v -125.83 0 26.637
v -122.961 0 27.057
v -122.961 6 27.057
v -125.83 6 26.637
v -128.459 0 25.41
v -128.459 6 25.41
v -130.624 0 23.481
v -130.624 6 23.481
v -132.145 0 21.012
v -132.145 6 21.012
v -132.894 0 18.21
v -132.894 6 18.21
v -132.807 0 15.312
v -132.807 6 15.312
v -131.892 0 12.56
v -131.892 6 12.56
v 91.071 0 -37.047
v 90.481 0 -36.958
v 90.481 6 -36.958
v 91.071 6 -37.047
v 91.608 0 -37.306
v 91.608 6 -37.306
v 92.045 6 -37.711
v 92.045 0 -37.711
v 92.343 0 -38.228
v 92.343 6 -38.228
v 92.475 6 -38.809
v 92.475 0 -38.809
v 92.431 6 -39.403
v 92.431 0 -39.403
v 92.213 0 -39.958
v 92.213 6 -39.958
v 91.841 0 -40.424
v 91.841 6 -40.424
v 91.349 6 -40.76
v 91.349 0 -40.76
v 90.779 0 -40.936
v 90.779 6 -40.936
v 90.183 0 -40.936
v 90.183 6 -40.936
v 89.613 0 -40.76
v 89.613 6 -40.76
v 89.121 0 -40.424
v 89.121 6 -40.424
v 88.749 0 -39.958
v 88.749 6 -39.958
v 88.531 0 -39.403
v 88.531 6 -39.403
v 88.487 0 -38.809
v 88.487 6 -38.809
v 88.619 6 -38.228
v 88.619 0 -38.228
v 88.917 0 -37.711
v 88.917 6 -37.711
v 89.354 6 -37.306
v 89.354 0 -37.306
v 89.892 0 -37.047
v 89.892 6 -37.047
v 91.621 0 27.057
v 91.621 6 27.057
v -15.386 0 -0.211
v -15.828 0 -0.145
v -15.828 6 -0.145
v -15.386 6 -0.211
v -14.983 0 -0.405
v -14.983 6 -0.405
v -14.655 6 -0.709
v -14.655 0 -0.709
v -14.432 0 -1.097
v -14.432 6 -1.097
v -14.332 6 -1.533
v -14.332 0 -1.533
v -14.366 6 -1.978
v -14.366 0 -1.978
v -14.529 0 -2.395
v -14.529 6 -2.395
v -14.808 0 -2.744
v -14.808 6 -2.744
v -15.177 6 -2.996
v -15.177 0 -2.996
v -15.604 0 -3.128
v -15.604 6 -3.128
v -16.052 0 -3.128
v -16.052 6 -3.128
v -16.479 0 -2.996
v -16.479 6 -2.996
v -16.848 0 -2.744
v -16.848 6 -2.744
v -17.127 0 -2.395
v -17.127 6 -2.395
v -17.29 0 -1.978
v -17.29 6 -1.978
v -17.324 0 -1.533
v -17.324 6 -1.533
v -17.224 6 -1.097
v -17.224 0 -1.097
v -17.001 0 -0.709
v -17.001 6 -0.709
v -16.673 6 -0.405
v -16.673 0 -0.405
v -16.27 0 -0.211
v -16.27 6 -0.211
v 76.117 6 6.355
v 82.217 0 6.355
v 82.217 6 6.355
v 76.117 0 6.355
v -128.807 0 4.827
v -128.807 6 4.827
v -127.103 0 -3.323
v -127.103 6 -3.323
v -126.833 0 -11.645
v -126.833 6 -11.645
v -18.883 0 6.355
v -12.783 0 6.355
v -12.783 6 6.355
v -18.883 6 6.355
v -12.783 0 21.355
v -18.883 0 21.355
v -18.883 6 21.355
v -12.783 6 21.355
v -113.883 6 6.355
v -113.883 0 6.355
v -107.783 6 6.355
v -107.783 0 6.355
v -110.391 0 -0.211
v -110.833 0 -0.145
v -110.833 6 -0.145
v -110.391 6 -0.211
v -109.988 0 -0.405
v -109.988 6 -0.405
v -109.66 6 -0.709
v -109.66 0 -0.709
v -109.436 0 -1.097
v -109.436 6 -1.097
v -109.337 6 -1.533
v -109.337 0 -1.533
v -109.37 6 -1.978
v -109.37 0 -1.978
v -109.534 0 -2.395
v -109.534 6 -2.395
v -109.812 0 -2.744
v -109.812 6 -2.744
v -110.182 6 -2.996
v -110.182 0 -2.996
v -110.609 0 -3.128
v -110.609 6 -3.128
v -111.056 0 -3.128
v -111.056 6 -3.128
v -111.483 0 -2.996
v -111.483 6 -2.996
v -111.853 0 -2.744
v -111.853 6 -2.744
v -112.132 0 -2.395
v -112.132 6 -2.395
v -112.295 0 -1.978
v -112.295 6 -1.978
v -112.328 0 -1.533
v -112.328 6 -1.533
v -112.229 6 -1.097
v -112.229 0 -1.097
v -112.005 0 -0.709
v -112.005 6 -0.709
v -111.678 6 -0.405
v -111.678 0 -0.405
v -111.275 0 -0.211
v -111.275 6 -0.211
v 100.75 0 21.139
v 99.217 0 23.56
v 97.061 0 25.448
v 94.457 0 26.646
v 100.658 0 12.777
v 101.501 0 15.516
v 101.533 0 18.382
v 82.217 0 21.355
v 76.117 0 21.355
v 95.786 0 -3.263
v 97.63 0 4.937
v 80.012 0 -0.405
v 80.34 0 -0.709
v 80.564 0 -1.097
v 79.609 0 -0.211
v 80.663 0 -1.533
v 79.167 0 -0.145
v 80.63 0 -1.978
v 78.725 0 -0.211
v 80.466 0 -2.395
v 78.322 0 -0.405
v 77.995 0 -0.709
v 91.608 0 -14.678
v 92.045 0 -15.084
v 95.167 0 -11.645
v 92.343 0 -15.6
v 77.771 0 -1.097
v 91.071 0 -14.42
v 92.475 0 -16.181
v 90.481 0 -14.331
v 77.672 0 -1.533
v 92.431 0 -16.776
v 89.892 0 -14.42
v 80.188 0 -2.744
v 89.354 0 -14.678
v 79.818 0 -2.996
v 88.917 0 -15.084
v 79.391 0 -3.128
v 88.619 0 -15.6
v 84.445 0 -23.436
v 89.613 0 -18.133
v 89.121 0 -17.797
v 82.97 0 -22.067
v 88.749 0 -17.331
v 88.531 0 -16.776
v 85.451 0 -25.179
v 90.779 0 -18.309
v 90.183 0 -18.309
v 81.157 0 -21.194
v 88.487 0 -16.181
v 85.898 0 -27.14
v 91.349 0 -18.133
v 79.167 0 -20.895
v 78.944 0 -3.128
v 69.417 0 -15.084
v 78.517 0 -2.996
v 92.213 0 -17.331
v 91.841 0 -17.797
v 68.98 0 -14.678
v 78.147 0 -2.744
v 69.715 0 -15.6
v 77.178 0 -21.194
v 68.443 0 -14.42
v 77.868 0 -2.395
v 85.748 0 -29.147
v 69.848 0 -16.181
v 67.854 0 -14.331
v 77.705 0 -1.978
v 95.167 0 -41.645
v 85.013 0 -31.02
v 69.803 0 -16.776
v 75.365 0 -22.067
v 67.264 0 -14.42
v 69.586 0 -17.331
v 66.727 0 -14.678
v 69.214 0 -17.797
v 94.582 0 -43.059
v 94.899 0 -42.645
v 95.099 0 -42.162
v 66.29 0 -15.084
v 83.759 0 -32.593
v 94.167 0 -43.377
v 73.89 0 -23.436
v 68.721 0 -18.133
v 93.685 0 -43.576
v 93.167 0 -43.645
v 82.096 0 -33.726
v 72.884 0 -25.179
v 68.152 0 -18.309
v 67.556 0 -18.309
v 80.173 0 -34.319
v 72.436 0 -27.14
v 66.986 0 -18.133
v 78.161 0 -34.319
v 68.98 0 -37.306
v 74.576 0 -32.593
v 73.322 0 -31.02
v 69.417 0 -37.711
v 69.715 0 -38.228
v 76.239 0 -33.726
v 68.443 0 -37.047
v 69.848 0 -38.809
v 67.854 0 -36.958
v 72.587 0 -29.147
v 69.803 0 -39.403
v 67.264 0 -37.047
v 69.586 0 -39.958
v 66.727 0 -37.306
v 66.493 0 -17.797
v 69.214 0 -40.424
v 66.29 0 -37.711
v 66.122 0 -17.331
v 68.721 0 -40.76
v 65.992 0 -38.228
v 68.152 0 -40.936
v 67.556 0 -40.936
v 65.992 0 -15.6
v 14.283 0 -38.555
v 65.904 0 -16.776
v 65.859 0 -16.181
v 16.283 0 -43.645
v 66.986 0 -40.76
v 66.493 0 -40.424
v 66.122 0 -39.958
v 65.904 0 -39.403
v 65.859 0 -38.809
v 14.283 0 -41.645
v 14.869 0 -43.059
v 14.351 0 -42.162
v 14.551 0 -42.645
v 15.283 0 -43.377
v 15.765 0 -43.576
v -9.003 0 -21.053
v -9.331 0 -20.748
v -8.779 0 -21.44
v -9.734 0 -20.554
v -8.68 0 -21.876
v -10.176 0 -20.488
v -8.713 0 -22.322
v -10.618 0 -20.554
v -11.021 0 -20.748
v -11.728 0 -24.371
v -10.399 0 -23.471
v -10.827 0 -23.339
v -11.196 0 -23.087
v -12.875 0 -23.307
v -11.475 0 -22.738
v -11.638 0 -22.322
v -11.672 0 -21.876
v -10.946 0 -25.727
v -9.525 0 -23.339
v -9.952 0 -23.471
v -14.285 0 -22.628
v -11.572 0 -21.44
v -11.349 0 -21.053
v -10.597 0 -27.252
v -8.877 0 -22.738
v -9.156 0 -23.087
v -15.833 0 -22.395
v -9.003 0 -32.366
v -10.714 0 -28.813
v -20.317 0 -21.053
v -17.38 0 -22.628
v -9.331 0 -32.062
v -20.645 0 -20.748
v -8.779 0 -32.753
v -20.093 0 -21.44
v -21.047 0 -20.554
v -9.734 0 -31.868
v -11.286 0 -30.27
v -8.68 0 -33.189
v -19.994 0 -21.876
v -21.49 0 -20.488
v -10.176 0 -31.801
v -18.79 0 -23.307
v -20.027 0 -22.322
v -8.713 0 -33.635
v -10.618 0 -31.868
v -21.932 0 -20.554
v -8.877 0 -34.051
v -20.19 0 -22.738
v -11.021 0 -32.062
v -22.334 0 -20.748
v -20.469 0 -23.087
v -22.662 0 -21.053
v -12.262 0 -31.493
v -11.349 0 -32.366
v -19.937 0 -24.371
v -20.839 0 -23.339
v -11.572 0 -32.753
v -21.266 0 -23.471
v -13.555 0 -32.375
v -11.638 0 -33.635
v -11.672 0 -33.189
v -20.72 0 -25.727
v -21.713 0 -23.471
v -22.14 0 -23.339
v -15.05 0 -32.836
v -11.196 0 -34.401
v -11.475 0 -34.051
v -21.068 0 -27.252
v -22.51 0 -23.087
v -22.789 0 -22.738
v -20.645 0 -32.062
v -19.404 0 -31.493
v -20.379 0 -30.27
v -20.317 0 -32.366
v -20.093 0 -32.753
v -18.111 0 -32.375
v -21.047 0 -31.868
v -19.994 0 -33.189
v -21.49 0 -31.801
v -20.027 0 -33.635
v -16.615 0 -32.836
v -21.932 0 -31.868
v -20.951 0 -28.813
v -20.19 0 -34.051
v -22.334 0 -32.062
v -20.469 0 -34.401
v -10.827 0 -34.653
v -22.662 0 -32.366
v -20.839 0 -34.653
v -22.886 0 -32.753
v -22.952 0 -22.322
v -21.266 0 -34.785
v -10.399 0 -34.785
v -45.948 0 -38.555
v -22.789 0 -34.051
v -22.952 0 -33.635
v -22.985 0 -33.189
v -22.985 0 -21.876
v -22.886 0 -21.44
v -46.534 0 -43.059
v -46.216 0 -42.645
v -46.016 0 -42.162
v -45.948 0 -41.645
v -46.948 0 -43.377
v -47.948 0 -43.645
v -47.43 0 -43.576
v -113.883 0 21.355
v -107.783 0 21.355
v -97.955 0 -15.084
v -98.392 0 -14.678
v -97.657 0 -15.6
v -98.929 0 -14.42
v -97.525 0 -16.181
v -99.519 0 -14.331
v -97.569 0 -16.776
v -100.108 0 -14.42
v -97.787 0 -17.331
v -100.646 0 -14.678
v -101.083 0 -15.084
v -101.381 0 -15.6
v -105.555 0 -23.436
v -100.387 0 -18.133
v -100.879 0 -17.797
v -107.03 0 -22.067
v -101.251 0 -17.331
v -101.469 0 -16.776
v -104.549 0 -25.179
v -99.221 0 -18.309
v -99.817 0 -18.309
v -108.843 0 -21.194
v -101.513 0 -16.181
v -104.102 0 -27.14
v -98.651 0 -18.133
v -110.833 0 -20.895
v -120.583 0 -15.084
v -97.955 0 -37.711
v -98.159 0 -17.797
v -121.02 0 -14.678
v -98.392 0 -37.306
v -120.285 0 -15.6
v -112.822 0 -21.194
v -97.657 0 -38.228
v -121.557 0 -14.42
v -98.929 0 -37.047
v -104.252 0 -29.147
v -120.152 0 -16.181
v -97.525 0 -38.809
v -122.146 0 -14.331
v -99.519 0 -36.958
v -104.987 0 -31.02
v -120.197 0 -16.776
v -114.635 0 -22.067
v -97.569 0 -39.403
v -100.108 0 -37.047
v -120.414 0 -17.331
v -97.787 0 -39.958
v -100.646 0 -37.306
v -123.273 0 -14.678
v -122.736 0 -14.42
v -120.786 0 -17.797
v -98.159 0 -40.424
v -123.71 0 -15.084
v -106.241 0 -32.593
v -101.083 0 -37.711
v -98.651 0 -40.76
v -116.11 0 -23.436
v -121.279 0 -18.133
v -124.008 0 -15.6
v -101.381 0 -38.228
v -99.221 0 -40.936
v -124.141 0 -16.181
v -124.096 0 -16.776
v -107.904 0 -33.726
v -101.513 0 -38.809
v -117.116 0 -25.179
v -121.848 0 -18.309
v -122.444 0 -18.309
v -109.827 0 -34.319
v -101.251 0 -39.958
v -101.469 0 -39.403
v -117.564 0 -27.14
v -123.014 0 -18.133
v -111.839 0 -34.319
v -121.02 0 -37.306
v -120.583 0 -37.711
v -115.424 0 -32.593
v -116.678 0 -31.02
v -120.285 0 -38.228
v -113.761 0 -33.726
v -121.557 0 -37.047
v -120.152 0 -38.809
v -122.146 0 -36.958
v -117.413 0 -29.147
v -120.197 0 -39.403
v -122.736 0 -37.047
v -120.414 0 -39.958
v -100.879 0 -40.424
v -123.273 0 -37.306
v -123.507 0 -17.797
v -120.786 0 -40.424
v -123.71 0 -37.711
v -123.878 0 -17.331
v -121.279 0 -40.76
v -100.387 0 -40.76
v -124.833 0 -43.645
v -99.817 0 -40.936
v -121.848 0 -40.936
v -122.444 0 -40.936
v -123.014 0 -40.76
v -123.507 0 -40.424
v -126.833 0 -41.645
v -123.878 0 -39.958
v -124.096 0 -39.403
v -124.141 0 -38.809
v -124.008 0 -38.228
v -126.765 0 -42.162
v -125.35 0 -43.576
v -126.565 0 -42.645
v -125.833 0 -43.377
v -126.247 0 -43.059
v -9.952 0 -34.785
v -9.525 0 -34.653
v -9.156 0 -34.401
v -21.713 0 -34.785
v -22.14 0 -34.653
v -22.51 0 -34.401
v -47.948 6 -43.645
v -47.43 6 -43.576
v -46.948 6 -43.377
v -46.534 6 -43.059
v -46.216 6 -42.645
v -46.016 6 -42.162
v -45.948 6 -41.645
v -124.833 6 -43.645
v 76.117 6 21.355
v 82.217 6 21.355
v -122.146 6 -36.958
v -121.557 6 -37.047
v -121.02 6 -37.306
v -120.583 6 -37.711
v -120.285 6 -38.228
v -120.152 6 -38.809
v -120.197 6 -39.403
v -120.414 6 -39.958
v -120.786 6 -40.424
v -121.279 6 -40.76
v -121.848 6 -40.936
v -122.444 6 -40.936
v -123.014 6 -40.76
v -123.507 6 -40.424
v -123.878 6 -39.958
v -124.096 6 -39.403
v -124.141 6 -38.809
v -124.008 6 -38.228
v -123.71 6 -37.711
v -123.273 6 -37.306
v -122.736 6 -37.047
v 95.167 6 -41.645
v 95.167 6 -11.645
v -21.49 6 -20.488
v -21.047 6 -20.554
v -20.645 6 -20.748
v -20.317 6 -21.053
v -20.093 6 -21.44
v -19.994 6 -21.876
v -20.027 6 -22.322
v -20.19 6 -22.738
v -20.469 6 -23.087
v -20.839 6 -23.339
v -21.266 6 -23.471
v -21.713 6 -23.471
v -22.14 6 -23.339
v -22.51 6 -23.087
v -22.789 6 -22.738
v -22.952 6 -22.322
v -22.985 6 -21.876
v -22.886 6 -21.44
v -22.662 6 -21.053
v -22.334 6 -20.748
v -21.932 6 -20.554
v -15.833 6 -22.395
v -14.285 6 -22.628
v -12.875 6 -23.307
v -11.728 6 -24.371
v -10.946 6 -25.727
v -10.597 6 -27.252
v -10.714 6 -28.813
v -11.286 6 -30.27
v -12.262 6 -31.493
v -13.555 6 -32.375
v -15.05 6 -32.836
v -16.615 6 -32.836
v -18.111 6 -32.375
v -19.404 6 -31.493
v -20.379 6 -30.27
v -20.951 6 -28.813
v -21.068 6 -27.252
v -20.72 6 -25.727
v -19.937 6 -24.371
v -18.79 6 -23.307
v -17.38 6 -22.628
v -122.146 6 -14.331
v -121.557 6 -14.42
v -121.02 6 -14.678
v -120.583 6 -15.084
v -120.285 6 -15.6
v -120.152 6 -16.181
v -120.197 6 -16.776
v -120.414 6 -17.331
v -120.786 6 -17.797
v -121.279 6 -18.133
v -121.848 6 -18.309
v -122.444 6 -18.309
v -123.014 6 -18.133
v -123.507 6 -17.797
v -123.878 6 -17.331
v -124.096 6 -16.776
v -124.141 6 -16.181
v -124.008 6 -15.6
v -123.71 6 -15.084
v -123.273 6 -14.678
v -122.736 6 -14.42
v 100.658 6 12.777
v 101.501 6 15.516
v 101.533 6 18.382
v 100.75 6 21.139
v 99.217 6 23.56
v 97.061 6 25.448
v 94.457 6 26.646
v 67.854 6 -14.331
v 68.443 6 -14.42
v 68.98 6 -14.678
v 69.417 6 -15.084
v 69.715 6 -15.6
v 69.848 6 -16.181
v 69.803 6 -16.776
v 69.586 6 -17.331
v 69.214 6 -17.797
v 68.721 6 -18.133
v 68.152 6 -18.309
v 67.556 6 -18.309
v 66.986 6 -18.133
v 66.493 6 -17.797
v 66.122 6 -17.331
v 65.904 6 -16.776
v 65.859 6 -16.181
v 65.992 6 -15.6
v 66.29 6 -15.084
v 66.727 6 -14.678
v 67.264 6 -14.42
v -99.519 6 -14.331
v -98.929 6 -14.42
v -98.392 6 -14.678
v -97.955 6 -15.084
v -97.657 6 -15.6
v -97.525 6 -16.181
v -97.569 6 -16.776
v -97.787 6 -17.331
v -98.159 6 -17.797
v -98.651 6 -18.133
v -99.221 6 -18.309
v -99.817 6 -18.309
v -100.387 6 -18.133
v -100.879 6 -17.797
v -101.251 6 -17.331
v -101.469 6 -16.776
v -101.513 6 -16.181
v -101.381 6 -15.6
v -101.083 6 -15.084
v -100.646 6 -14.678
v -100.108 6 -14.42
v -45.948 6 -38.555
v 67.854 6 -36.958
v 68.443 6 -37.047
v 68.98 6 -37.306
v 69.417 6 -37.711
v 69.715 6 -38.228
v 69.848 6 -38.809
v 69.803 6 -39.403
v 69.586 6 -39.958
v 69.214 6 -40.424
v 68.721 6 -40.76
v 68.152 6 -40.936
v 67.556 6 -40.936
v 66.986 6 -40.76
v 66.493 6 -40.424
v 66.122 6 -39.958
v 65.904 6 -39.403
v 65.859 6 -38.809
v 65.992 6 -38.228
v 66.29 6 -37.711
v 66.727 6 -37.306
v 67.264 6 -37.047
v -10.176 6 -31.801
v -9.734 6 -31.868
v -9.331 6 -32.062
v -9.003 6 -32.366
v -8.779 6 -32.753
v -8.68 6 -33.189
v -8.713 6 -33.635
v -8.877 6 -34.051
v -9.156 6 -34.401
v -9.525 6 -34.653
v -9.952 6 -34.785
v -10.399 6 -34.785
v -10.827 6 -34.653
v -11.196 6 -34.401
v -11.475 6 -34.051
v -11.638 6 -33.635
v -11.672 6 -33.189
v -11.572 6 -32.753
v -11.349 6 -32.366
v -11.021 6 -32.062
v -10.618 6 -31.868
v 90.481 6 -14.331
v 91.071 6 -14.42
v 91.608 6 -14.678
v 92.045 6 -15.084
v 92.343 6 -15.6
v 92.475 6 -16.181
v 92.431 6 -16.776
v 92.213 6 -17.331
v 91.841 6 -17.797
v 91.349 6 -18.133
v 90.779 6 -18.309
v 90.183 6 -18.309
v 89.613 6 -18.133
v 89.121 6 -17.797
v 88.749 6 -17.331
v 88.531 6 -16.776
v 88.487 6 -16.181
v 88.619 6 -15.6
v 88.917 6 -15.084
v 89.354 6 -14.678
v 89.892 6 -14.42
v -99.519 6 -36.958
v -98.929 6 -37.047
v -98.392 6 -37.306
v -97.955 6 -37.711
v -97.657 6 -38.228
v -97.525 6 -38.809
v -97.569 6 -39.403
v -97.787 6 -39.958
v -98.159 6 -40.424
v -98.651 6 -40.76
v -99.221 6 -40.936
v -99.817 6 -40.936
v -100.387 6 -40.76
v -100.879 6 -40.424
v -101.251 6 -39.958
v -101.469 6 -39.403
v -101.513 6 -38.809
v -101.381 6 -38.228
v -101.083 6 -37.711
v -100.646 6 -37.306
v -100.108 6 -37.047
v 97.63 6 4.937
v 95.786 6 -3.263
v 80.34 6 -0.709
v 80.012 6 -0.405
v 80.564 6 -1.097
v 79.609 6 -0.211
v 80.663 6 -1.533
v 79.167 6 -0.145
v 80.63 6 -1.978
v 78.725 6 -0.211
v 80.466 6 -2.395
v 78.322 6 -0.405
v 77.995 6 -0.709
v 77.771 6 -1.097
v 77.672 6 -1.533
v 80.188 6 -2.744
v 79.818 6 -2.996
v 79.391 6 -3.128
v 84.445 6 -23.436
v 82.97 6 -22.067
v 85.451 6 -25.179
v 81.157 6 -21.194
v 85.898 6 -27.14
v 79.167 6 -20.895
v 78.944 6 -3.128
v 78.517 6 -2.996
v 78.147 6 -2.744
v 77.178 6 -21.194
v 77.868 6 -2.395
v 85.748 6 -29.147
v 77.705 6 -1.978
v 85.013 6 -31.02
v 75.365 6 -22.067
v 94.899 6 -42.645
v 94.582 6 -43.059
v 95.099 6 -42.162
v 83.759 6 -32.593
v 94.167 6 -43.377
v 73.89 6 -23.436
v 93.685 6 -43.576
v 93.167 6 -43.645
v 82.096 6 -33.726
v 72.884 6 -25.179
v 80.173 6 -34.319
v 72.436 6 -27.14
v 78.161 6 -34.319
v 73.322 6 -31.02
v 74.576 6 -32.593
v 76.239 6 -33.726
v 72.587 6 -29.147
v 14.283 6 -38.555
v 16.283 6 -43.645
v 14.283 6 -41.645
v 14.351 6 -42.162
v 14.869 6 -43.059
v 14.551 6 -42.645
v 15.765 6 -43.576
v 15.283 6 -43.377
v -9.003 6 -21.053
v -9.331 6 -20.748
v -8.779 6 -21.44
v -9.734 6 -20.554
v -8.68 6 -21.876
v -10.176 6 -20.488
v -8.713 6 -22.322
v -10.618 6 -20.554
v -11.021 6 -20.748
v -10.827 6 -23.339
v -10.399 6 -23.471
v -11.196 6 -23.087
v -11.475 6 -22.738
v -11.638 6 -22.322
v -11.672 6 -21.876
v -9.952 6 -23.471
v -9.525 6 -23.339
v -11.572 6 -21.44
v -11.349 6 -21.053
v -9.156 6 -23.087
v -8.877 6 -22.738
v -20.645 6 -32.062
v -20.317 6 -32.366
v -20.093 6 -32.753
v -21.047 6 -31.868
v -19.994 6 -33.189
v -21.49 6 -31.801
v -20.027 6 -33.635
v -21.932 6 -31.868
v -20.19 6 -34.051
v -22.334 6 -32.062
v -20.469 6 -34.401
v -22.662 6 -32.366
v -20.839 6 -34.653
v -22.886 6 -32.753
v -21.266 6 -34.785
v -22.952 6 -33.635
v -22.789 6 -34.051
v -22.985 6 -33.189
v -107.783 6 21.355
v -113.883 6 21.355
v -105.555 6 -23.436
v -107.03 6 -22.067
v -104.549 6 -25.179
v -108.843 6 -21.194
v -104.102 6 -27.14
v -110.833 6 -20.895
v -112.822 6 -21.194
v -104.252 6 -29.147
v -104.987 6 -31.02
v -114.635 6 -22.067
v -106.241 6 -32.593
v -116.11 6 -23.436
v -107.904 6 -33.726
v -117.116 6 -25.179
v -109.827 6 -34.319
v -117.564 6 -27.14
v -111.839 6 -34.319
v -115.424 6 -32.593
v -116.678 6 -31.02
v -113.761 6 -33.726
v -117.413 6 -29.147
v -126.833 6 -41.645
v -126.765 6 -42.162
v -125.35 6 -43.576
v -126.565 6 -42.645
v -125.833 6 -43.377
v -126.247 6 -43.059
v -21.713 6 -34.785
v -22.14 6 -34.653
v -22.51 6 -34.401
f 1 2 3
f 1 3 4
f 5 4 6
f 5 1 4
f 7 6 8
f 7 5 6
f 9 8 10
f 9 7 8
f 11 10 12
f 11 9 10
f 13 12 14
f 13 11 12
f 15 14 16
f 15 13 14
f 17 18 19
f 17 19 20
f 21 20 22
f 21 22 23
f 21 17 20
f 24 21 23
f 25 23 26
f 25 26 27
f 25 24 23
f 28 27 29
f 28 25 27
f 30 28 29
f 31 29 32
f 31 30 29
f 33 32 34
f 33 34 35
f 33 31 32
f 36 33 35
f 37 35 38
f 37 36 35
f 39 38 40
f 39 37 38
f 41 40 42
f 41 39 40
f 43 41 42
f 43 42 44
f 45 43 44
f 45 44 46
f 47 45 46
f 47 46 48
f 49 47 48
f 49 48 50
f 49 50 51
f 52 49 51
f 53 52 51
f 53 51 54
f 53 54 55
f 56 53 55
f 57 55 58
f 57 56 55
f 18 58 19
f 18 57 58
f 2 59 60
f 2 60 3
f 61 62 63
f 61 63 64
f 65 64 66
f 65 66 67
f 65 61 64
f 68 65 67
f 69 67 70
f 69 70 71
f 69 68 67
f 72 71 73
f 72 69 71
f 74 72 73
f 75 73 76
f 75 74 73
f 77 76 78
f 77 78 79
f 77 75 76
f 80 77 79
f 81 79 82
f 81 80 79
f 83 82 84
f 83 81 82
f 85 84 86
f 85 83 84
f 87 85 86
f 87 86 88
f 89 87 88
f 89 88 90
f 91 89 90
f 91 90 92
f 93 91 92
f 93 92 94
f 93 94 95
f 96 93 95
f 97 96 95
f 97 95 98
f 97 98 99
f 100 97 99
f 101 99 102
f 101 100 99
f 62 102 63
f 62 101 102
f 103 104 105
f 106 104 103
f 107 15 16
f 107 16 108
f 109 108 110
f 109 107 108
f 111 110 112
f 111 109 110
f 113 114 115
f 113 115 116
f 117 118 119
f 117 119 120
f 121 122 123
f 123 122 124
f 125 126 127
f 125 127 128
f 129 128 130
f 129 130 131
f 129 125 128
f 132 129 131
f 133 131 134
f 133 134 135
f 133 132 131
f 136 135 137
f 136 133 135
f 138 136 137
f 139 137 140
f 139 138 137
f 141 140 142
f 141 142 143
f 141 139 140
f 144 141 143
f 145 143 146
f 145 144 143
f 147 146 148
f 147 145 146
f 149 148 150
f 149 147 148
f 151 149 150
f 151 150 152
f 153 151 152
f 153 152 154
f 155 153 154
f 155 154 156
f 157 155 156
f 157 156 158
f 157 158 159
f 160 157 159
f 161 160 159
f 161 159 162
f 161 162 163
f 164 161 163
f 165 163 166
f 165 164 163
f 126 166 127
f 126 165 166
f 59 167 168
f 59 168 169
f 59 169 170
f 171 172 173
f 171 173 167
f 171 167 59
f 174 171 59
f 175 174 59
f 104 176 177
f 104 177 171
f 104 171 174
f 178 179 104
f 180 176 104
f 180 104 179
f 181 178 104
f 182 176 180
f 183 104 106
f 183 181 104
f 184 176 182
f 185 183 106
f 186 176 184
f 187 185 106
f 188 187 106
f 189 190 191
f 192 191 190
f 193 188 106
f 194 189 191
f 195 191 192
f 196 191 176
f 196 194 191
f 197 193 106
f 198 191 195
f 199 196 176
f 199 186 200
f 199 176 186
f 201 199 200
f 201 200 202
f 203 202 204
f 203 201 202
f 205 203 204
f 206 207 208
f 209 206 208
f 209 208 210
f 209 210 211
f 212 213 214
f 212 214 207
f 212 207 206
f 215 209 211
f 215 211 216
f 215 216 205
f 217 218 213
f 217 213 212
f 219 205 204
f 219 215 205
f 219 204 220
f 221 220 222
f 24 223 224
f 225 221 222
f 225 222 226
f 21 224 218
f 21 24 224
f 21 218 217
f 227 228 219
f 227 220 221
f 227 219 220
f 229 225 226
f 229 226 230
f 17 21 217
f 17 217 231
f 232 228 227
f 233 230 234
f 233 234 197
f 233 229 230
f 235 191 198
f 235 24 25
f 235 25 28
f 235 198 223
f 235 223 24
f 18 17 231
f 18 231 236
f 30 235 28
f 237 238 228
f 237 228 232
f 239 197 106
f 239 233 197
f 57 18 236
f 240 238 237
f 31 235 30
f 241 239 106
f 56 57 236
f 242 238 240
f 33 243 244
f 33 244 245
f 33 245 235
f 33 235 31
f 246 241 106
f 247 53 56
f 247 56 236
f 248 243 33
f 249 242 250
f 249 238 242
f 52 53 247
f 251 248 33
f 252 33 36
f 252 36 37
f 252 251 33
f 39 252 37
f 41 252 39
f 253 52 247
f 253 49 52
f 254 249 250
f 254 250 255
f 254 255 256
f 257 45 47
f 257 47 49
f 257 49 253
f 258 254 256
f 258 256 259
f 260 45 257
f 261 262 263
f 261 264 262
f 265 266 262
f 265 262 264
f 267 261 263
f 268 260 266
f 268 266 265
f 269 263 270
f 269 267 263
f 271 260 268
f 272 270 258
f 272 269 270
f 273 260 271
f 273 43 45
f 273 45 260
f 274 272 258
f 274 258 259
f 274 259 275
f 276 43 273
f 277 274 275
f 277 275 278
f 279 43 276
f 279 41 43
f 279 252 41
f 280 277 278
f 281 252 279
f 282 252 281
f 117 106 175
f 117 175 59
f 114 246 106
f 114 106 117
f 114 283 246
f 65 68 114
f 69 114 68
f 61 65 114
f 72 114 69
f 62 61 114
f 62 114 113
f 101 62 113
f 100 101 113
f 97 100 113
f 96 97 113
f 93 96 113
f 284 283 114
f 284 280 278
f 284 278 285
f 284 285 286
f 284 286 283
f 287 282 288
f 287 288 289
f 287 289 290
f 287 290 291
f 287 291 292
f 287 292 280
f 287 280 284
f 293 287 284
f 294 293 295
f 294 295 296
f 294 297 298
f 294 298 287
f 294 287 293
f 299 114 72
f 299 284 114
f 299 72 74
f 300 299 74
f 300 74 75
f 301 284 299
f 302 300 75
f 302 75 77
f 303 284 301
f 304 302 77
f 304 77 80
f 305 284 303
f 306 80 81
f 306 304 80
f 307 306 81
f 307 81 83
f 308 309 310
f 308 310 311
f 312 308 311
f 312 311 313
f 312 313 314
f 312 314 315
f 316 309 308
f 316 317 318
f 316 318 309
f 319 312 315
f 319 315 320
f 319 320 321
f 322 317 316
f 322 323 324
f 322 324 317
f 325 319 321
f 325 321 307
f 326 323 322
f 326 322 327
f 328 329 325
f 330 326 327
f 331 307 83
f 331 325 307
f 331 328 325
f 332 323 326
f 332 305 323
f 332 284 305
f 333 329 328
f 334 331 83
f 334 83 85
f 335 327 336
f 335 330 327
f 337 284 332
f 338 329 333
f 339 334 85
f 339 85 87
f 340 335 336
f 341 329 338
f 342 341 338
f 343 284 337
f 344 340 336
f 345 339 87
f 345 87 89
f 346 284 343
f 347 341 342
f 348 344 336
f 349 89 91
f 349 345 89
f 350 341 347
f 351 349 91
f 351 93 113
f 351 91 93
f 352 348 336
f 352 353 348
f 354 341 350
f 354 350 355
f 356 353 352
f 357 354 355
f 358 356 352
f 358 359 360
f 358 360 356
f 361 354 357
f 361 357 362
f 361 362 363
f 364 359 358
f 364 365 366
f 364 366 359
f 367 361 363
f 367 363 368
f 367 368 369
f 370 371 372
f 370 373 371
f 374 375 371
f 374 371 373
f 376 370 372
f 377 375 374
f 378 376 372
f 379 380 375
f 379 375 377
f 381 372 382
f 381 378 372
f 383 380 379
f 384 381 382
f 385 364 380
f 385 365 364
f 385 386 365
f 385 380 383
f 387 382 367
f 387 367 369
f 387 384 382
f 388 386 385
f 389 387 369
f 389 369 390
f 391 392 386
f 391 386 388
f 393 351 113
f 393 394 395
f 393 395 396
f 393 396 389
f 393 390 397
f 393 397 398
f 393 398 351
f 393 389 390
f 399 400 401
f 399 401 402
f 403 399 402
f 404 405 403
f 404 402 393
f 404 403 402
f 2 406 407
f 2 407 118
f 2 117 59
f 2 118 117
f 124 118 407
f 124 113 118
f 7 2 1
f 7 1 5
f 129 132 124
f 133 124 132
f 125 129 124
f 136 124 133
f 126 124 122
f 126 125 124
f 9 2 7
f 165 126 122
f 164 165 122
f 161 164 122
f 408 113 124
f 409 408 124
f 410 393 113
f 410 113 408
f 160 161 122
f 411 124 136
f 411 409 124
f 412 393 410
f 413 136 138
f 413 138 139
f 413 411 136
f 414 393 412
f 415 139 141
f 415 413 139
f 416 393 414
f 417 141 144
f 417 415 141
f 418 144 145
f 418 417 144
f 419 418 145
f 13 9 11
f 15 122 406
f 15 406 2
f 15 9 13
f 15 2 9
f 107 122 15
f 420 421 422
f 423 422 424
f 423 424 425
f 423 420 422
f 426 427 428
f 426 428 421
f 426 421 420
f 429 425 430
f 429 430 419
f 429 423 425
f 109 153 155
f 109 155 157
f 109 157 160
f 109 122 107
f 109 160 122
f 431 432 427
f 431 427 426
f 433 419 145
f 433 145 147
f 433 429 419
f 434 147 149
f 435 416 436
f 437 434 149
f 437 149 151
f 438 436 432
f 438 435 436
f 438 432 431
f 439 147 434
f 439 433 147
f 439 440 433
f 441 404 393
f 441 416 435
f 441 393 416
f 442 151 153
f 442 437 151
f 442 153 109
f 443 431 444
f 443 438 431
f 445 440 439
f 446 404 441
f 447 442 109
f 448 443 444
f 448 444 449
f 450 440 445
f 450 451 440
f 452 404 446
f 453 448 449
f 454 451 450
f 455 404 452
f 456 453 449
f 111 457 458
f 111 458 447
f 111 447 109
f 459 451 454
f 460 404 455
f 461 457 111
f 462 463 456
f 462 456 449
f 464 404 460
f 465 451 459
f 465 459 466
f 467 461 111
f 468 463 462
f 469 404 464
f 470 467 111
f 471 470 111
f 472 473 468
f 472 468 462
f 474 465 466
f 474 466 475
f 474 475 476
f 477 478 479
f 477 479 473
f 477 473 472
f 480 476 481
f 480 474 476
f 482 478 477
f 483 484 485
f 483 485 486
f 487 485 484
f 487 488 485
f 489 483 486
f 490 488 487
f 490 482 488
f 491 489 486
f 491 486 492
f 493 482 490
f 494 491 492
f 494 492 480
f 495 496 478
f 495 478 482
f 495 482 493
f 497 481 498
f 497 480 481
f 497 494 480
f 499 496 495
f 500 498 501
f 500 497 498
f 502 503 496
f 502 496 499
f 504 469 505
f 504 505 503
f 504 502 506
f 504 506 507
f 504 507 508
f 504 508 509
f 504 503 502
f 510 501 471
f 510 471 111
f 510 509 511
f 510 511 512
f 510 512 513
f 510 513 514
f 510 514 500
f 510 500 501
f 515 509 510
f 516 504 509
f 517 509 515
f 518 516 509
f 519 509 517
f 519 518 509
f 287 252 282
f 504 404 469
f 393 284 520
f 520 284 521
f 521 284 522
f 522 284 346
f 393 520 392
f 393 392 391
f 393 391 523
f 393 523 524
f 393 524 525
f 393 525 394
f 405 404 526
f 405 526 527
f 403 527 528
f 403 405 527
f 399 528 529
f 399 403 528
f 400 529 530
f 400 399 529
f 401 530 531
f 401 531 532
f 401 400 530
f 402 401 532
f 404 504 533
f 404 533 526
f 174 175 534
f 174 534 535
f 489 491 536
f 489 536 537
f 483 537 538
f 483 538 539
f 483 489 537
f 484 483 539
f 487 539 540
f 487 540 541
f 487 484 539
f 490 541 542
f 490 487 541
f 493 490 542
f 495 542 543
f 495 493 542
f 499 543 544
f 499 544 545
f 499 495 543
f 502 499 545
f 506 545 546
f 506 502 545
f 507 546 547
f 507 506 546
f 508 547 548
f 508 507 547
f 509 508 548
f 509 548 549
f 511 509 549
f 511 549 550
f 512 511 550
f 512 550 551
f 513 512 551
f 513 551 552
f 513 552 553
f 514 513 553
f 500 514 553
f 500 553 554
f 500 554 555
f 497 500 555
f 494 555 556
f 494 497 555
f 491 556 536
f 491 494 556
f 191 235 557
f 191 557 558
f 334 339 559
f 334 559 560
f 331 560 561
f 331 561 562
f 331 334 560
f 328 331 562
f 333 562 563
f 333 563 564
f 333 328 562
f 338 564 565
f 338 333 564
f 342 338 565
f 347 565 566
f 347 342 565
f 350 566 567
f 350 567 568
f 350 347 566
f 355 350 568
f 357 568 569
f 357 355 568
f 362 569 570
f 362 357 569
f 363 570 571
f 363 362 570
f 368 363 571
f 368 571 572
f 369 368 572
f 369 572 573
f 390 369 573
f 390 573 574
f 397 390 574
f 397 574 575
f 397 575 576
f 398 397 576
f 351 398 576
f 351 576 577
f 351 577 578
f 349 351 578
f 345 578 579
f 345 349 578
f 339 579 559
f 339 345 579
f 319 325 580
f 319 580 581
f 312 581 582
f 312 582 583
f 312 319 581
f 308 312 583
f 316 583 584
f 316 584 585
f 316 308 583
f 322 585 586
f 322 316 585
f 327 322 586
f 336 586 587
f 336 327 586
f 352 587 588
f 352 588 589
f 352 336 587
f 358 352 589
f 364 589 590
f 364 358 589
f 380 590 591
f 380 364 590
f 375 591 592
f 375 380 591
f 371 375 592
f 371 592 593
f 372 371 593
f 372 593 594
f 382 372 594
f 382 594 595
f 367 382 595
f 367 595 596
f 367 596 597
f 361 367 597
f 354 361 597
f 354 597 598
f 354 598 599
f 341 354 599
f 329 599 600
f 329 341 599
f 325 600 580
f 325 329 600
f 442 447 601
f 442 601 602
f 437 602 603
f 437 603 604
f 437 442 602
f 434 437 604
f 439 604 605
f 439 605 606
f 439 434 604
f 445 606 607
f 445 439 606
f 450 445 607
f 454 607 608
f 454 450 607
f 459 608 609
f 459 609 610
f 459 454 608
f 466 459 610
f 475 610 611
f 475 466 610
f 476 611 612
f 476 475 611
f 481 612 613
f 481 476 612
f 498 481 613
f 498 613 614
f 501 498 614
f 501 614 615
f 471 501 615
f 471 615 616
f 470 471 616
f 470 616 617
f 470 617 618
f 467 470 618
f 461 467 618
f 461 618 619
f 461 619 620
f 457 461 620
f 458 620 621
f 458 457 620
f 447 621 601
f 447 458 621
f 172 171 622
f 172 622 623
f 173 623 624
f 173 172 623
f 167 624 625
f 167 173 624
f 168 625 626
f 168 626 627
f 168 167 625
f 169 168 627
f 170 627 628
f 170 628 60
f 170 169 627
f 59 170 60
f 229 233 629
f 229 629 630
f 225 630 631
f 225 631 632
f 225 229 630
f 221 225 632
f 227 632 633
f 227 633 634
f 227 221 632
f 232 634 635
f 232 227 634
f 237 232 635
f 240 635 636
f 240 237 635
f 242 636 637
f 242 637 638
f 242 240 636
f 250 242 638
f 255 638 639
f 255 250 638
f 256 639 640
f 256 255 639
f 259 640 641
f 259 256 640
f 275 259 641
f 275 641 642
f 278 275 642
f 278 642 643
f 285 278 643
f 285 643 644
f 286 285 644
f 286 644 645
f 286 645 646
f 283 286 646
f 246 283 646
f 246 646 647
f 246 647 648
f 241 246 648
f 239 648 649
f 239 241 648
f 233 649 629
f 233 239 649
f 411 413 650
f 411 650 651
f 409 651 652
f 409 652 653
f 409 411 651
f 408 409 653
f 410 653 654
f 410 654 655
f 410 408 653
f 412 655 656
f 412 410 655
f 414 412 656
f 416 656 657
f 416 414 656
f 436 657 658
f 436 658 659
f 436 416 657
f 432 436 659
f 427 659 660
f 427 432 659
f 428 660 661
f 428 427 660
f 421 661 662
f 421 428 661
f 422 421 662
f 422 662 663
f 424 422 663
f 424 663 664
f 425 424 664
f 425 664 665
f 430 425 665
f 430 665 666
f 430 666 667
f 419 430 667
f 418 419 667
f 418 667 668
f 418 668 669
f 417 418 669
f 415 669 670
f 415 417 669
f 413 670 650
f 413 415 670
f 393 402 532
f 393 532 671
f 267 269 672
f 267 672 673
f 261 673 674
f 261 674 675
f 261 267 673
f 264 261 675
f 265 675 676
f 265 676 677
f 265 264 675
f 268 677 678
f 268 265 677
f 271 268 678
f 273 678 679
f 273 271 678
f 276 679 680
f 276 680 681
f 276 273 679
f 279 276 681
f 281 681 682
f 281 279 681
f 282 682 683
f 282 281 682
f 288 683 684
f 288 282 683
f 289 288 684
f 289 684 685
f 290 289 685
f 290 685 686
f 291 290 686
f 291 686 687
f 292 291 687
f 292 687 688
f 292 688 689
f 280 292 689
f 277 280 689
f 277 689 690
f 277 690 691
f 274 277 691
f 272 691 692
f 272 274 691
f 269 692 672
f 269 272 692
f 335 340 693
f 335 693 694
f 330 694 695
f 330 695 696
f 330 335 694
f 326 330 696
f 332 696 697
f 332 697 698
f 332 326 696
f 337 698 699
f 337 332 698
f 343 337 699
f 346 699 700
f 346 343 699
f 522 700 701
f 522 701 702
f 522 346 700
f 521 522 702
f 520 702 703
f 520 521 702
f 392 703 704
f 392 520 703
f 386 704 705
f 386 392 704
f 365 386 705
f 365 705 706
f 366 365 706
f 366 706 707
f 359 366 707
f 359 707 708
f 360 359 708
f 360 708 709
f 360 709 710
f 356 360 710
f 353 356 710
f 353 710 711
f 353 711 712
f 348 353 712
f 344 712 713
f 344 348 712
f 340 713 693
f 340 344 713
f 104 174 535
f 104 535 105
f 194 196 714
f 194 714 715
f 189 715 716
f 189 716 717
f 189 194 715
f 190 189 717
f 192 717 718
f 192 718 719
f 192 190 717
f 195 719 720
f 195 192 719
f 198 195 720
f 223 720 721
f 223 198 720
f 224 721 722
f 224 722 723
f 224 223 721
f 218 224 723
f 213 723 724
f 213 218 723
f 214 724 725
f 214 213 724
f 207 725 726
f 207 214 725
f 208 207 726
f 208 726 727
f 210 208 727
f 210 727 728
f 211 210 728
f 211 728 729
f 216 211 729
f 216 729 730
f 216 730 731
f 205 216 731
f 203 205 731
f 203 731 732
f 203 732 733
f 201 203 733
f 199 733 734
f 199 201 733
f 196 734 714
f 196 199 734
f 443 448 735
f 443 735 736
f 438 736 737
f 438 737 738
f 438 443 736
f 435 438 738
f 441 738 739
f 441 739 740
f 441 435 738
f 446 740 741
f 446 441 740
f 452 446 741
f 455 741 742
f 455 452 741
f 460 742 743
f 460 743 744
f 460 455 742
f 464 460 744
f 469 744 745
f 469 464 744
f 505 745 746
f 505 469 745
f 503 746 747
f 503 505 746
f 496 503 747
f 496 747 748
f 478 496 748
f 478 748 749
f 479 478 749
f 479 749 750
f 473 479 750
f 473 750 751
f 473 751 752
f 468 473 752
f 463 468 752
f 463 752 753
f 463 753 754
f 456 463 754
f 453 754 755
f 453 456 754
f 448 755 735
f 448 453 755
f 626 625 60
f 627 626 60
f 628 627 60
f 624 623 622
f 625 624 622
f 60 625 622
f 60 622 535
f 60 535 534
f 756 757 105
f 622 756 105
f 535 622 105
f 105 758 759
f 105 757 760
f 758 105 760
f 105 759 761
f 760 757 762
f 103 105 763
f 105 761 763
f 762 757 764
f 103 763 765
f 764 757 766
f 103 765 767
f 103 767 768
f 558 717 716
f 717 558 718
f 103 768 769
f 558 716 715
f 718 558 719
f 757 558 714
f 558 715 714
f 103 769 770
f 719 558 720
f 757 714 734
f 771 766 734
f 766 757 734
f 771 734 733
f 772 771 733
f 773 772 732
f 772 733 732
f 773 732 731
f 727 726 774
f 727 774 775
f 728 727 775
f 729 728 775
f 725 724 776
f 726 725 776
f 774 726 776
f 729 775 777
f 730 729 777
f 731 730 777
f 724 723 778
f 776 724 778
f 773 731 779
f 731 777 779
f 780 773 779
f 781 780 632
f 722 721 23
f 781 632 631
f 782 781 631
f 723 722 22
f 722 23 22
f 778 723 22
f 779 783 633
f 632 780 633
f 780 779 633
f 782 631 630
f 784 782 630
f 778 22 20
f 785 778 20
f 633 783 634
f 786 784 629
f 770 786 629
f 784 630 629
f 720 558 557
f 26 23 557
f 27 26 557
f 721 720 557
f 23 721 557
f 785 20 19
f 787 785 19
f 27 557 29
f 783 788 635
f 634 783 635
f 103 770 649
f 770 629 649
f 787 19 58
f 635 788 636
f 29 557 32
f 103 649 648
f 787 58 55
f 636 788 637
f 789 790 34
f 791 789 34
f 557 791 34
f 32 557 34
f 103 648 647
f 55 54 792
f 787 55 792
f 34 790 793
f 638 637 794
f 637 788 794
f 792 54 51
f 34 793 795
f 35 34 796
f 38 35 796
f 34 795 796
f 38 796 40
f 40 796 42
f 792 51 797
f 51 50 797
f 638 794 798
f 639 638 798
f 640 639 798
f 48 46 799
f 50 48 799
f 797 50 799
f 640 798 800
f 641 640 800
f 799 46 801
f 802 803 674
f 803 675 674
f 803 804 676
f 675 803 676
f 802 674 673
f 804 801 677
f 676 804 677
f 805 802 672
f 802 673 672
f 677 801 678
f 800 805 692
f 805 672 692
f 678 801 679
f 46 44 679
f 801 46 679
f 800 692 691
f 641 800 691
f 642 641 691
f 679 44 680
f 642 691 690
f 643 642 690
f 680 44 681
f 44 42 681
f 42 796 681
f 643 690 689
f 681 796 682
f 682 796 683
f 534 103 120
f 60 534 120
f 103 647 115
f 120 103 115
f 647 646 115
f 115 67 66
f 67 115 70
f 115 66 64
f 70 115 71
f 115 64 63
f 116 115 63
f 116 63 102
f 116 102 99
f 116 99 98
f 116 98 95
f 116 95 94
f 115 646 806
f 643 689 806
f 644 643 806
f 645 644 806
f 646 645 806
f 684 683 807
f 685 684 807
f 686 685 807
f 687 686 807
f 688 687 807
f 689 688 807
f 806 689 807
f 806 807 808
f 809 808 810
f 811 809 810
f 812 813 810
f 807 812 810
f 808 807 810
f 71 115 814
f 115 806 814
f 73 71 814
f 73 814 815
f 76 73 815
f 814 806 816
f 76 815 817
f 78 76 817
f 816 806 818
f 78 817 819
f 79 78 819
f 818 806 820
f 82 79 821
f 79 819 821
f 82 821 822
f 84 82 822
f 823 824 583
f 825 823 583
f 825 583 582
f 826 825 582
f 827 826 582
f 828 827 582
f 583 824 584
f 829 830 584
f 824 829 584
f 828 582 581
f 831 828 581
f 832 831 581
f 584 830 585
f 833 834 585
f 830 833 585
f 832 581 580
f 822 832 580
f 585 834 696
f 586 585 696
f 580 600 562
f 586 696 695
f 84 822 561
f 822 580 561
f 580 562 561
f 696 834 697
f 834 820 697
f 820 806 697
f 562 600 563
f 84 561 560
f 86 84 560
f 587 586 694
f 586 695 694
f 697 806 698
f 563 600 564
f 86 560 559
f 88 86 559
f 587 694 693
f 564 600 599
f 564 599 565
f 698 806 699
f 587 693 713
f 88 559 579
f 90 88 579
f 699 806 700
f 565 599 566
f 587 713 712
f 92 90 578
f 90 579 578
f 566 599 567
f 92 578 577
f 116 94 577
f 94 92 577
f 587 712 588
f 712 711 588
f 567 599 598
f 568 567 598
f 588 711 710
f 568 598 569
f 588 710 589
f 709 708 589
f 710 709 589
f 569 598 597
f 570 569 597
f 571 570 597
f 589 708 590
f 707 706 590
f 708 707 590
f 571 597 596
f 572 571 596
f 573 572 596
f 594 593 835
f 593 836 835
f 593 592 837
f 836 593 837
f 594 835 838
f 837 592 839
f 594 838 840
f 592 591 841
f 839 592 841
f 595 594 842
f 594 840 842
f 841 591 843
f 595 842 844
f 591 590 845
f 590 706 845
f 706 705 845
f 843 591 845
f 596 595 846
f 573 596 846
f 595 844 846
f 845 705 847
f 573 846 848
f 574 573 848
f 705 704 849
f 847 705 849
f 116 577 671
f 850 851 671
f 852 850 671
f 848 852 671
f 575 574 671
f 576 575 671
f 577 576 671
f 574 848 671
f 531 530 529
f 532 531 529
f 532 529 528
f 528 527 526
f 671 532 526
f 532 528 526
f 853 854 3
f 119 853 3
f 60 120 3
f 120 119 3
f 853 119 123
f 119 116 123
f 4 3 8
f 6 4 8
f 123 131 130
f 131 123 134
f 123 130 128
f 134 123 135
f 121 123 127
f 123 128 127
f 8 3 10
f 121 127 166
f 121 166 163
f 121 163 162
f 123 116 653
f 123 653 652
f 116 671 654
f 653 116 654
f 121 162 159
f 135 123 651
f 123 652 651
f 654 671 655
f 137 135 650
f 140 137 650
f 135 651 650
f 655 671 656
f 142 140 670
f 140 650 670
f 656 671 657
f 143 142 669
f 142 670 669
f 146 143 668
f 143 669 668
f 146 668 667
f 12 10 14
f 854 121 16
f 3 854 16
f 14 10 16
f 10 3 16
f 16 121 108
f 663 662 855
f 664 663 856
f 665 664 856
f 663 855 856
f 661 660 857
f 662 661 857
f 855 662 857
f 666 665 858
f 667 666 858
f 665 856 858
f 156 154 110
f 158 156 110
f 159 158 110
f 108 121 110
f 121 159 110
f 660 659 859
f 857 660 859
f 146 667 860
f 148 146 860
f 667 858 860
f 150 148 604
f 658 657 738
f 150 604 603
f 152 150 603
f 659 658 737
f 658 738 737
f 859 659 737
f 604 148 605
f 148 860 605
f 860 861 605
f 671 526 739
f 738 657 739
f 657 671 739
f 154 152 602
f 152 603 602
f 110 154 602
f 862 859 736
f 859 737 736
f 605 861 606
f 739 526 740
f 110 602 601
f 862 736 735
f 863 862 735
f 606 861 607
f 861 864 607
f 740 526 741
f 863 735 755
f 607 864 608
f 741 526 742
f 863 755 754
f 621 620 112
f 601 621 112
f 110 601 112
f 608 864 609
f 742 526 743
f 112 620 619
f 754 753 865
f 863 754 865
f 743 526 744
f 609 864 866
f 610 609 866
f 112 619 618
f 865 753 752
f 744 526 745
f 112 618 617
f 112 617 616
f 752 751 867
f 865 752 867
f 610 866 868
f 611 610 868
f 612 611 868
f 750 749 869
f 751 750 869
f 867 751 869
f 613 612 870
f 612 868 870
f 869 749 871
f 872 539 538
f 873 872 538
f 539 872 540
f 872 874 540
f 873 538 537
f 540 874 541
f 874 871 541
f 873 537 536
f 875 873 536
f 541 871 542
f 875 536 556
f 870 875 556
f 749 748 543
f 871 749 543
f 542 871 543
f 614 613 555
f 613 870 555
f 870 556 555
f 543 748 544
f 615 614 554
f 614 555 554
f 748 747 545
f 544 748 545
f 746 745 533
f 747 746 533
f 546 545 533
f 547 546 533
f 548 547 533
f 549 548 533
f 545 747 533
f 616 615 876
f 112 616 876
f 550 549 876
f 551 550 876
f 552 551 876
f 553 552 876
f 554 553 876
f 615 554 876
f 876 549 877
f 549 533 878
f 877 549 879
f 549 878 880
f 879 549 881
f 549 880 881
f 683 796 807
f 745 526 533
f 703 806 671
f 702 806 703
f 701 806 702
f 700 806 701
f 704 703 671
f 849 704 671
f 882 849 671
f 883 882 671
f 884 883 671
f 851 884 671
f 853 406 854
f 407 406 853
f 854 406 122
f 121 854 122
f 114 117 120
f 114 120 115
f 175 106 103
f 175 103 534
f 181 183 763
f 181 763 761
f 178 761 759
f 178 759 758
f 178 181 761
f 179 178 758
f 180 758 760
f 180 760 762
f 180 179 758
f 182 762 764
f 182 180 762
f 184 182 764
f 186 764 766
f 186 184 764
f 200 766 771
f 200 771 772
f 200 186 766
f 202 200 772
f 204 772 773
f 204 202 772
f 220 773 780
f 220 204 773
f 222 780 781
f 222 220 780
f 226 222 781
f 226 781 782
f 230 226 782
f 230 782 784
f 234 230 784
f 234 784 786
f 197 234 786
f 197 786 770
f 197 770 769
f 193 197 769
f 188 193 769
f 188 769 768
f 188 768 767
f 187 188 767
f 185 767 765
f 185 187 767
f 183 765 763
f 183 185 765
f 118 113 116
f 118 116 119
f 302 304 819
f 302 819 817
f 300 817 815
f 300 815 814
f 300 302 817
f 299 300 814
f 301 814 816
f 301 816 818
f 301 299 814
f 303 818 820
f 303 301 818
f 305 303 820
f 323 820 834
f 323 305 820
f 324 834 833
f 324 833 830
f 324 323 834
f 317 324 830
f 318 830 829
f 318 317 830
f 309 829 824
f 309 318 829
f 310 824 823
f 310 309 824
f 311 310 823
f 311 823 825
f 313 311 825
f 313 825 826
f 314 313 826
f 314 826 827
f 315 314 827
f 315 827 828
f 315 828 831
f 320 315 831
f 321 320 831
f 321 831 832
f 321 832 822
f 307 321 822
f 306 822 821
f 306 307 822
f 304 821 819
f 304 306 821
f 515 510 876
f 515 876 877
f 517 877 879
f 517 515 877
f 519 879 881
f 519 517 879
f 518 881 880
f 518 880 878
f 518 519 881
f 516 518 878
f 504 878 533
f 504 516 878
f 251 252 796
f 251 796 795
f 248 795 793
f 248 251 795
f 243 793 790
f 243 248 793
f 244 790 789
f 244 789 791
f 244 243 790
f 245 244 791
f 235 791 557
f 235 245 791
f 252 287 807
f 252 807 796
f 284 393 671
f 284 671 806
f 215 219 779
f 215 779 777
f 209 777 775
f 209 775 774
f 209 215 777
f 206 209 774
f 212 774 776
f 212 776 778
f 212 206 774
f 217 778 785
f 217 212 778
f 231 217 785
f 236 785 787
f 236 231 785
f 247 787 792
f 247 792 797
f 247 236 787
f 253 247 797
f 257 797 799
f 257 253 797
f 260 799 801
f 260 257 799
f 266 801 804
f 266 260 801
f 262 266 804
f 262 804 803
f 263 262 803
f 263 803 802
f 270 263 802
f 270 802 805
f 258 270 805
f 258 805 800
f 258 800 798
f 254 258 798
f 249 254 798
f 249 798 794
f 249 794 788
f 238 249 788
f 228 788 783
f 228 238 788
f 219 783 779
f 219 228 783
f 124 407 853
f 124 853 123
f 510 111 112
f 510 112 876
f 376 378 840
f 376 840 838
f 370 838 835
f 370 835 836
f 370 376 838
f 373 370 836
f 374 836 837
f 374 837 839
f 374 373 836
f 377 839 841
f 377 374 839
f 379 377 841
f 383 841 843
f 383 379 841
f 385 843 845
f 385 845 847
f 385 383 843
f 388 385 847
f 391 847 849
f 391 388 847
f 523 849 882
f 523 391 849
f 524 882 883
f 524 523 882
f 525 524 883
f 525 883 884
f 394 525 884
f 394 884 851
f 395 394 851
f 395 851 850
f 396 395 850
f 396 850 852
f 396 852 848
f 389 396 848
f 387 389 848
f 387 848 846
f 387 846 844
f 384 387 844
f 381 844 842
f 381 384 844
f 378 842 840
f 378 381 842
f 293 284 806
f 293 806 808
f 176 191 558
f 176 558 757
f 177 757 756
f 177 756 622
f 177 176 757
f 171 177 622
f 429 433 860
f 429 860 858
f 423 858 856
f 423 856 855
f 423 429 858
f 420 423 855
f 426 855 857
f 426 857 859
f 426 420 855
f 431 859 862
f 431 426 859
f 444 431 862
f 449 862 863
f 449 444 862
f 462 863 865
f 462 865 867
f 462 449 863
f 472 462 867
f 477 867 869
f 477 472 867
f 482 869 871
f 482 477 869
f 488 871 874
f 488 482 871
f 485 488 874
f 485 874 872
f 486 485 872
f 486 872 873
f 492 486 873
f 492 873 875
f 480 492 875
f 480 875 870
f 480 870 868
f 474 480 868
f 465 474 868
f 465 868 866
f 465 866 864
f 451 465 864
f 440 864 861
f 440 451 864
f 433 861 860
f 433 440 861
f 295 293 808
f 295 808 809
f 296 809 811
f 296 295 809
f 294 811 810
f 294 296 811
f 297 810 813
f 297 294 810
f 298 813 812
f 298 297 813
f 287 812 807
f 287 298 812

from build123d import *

# Parameters (mm, degrees)
CROQUIS1_R              = 5.25
CROQUIS1_R_2            = 6.75
CROQUIS1_R_3            = 2
CROQUIS1_R_4            = 1.5
CROQUIS1_W              = 6.1
CROQUIS1_H              = 15
SALIENTE_EXTRUIR1_DEPTH = 6


with BuildPart() as part:
    # Croquis1 → Saliente-Extruir1 (new body)
    with BuildSketch(Plane(origin=(0, 0, 0), x_dir=(1, 0, 0), z_dir=(0, 1, 0))):
        with BuildLine():
            Line((16.282727366, 43.644609037), (71.802987861, 43.644609037))
            Line((71.802987861, 43.644609037), (93.167350191, 43.644609037))
            ThreePointArc((93.167350191, 43.644609037), (94.581563754, 43.058822599), (95.167350191, 41.644609037))
            Line((95.167350191, 41.644609037), (95.167350191, 11.644653108))
            ThreePointArc((95.167350191, 11.644653108), (96.557023393, -0.870818798), (100.658344058, -12.7765904))
            ThreePointArc((100.658344058, -12.7765904), (100.070791822, -22.404752266), (91.620792474, -27.057088195))
            Line((91.620792474, -27.057088195), (-122.960915675, -27.057088195))
            ThreePointArc((-122.960915675, -27.057088195), (-131.47488844, -22.30230199), (-131.892437156, -12.559541748))
            ThreePointArc((-131.892437156, -12.559541748), (-127.777809493, -0.78872644), (-126.832649809, 11.644653108))
            Line((-126.832649809, 11.644653108), (-126.832649809, 41.644609037))
            ThreePointArc((-126.832649809, 41.644609037), (-126.246863371, 43.058822599), (-124.832649809, 43.644609037))
            Line((-124.832649809, 43.644609037), (-103.468287478, 43.644609037))
            Line((-103.468287478, 43.644609037), (-60.497048313, 43.644609037))
            Line((-60.497048313, 43.644609037), (-47.948026983, 43.644609037))
            ThreePointArc((-47.948026983, 43.644609037), (-46.533813421, 43.058822599), (-45.948026983, 41.644609037))
            Line((-45.948026983, 41.644609037), (-45.948026983, 38.554619052))
            Line((-45.948026983, 38.554619052), (14.282727366, 38.554619052))
            Line((14.282727366, 38.554619052), (14.282727366, 41.644609037))
            ThreePointArc((14.282727366, 41.644609037), (14.868513803, 43.058822599), (16.282727366, 43.644609037))
        make_face()
        with Locations(Location((-15.832649809, 27.644609037, 0), (0, 0, 270))):
            Circle(CROQUIS1_R, mode=Mode.SUBTRACT)
        with Locations(Location((-110.832649809, 27.644609037, 0), (0, 0, 270))):
            Circle(CROQUIS1_R_2, mode=Mode.SUBTRACT)
        with Locations(Location((79.167350191, 27.644609037, 0), (0, 0, 270))):
            Circle(CROQUIS1_R_2, mode=Mode.SUBTRACT)
        with Locations(Location((-99.51894131, 38.958317536, 0), (0, 0, 270))):
            Circle(CROQUIS1_R_3, mode=Mode.SUBTRACT)
        with Locations(Location((-122.146358308, 38.958317536, 0), (0, 0, 270))):
            Circle(CROQUIS1_R_3, mode=Mode.SUBTRACT)
        with Locations(Location((-99.51894131, 16.330900538, 0), (0, 0, 270))):
            Circle(CROQUIS1_R_3, mode=Mode.SUBTRACT)
        with Locations(Location((-122.146358308, 16.330900538, 0), (0, 0, 270))):
            Circle(CROQUIS1_R_3, mode=Mode.SUBTRACT)
        with Locations(Location((90.48105869, 16.330900538, 0), (0, 0, 270))):
            Circle(CROQUIS1_R_3, mode=Mode.SUBTRACT)
        with Locations(Location((67.853641692, 16.330900538, 0), (0, 0, 270))):
            Circle(CROQUIS1_R_3, mode=Mode.SUBTRACT)
        with Locations(Location((67.853641692, 38.958317536, 0), (0, 0, 270))):
            Circle(CROQUIS1_R_3, mode=Mode.SUBTRACT)
        with Locations(Location((-10.175795559, 33.301463286, 0), (0, 0, 270))):
            Circle(CROQUIS1_R_4, mode=Mode.SUBTRACT)
        with Locations(Location((-21.489504058, 33.301463286, 0), (0, 0, 270))):
            Circle(CROQUIS1_R_4, mode=Mode.SUBTRACT)
        with Locations(Location((-21.489504058, 21.987754787, 0), (0, 0, 270))):
            Circle(CROQUIS1_R_4, mode=Mode.SUBTRACT)
        with Locations(Location((-10.175795559, 21.987754787, 0), (0, 0, 270))):
            Circle(CROQUIS1_R_4, mode=Mode.SUBTRACT)
        with Locations(Location((-110.832649809, 1.644609037, 0), (0, 0, 270))):
            Circle(CROQUIS1_R_4, mode=Mode.SUBTRACT)
        with Locations(Location((79.167361237, 1.644649397, 0), (0, 0, 270))):
            Circle(CROQUIS1_R_4, mode=Mode.SUBTRACT)
        with Locations(Location((90.48105869, 38.958317536, 0), (0, 0, 270))):
            Circle(CROQUIS1_R_3, mode=Mode.SUBTRACT)
        with Locations(Location((-15.828049724, 1.644627362, 0), (0, 0, 270))):
            Circle(CROQUIS1_R_4, mode=Mode.SUBTRACT)
        with Locations((-110.832649809, -13.855390963)):
            Rectangle(CROQUIS1_W, CROQUIS1_H, mode=Mode.SUBTRACT)
        Polygon((76.117364636, -6.355351899), (76.117371009, -21.355351899), (82.217371009, -21.355349308), (82.217364636, -6.355349308), align=None, mode=Mode.SUBTRACT)
        Polygon((-18.88264641, -6.355351899), (-18.882640037, -21.355351899), (-12.782640037, -21.355349308), (-12.78264641, -6.355349308), align=None, mode=Mode.SUBTRACT)
    extrude(amount=SALIENTE_EXTRUIR1_DEPTH)


solid = part.part
